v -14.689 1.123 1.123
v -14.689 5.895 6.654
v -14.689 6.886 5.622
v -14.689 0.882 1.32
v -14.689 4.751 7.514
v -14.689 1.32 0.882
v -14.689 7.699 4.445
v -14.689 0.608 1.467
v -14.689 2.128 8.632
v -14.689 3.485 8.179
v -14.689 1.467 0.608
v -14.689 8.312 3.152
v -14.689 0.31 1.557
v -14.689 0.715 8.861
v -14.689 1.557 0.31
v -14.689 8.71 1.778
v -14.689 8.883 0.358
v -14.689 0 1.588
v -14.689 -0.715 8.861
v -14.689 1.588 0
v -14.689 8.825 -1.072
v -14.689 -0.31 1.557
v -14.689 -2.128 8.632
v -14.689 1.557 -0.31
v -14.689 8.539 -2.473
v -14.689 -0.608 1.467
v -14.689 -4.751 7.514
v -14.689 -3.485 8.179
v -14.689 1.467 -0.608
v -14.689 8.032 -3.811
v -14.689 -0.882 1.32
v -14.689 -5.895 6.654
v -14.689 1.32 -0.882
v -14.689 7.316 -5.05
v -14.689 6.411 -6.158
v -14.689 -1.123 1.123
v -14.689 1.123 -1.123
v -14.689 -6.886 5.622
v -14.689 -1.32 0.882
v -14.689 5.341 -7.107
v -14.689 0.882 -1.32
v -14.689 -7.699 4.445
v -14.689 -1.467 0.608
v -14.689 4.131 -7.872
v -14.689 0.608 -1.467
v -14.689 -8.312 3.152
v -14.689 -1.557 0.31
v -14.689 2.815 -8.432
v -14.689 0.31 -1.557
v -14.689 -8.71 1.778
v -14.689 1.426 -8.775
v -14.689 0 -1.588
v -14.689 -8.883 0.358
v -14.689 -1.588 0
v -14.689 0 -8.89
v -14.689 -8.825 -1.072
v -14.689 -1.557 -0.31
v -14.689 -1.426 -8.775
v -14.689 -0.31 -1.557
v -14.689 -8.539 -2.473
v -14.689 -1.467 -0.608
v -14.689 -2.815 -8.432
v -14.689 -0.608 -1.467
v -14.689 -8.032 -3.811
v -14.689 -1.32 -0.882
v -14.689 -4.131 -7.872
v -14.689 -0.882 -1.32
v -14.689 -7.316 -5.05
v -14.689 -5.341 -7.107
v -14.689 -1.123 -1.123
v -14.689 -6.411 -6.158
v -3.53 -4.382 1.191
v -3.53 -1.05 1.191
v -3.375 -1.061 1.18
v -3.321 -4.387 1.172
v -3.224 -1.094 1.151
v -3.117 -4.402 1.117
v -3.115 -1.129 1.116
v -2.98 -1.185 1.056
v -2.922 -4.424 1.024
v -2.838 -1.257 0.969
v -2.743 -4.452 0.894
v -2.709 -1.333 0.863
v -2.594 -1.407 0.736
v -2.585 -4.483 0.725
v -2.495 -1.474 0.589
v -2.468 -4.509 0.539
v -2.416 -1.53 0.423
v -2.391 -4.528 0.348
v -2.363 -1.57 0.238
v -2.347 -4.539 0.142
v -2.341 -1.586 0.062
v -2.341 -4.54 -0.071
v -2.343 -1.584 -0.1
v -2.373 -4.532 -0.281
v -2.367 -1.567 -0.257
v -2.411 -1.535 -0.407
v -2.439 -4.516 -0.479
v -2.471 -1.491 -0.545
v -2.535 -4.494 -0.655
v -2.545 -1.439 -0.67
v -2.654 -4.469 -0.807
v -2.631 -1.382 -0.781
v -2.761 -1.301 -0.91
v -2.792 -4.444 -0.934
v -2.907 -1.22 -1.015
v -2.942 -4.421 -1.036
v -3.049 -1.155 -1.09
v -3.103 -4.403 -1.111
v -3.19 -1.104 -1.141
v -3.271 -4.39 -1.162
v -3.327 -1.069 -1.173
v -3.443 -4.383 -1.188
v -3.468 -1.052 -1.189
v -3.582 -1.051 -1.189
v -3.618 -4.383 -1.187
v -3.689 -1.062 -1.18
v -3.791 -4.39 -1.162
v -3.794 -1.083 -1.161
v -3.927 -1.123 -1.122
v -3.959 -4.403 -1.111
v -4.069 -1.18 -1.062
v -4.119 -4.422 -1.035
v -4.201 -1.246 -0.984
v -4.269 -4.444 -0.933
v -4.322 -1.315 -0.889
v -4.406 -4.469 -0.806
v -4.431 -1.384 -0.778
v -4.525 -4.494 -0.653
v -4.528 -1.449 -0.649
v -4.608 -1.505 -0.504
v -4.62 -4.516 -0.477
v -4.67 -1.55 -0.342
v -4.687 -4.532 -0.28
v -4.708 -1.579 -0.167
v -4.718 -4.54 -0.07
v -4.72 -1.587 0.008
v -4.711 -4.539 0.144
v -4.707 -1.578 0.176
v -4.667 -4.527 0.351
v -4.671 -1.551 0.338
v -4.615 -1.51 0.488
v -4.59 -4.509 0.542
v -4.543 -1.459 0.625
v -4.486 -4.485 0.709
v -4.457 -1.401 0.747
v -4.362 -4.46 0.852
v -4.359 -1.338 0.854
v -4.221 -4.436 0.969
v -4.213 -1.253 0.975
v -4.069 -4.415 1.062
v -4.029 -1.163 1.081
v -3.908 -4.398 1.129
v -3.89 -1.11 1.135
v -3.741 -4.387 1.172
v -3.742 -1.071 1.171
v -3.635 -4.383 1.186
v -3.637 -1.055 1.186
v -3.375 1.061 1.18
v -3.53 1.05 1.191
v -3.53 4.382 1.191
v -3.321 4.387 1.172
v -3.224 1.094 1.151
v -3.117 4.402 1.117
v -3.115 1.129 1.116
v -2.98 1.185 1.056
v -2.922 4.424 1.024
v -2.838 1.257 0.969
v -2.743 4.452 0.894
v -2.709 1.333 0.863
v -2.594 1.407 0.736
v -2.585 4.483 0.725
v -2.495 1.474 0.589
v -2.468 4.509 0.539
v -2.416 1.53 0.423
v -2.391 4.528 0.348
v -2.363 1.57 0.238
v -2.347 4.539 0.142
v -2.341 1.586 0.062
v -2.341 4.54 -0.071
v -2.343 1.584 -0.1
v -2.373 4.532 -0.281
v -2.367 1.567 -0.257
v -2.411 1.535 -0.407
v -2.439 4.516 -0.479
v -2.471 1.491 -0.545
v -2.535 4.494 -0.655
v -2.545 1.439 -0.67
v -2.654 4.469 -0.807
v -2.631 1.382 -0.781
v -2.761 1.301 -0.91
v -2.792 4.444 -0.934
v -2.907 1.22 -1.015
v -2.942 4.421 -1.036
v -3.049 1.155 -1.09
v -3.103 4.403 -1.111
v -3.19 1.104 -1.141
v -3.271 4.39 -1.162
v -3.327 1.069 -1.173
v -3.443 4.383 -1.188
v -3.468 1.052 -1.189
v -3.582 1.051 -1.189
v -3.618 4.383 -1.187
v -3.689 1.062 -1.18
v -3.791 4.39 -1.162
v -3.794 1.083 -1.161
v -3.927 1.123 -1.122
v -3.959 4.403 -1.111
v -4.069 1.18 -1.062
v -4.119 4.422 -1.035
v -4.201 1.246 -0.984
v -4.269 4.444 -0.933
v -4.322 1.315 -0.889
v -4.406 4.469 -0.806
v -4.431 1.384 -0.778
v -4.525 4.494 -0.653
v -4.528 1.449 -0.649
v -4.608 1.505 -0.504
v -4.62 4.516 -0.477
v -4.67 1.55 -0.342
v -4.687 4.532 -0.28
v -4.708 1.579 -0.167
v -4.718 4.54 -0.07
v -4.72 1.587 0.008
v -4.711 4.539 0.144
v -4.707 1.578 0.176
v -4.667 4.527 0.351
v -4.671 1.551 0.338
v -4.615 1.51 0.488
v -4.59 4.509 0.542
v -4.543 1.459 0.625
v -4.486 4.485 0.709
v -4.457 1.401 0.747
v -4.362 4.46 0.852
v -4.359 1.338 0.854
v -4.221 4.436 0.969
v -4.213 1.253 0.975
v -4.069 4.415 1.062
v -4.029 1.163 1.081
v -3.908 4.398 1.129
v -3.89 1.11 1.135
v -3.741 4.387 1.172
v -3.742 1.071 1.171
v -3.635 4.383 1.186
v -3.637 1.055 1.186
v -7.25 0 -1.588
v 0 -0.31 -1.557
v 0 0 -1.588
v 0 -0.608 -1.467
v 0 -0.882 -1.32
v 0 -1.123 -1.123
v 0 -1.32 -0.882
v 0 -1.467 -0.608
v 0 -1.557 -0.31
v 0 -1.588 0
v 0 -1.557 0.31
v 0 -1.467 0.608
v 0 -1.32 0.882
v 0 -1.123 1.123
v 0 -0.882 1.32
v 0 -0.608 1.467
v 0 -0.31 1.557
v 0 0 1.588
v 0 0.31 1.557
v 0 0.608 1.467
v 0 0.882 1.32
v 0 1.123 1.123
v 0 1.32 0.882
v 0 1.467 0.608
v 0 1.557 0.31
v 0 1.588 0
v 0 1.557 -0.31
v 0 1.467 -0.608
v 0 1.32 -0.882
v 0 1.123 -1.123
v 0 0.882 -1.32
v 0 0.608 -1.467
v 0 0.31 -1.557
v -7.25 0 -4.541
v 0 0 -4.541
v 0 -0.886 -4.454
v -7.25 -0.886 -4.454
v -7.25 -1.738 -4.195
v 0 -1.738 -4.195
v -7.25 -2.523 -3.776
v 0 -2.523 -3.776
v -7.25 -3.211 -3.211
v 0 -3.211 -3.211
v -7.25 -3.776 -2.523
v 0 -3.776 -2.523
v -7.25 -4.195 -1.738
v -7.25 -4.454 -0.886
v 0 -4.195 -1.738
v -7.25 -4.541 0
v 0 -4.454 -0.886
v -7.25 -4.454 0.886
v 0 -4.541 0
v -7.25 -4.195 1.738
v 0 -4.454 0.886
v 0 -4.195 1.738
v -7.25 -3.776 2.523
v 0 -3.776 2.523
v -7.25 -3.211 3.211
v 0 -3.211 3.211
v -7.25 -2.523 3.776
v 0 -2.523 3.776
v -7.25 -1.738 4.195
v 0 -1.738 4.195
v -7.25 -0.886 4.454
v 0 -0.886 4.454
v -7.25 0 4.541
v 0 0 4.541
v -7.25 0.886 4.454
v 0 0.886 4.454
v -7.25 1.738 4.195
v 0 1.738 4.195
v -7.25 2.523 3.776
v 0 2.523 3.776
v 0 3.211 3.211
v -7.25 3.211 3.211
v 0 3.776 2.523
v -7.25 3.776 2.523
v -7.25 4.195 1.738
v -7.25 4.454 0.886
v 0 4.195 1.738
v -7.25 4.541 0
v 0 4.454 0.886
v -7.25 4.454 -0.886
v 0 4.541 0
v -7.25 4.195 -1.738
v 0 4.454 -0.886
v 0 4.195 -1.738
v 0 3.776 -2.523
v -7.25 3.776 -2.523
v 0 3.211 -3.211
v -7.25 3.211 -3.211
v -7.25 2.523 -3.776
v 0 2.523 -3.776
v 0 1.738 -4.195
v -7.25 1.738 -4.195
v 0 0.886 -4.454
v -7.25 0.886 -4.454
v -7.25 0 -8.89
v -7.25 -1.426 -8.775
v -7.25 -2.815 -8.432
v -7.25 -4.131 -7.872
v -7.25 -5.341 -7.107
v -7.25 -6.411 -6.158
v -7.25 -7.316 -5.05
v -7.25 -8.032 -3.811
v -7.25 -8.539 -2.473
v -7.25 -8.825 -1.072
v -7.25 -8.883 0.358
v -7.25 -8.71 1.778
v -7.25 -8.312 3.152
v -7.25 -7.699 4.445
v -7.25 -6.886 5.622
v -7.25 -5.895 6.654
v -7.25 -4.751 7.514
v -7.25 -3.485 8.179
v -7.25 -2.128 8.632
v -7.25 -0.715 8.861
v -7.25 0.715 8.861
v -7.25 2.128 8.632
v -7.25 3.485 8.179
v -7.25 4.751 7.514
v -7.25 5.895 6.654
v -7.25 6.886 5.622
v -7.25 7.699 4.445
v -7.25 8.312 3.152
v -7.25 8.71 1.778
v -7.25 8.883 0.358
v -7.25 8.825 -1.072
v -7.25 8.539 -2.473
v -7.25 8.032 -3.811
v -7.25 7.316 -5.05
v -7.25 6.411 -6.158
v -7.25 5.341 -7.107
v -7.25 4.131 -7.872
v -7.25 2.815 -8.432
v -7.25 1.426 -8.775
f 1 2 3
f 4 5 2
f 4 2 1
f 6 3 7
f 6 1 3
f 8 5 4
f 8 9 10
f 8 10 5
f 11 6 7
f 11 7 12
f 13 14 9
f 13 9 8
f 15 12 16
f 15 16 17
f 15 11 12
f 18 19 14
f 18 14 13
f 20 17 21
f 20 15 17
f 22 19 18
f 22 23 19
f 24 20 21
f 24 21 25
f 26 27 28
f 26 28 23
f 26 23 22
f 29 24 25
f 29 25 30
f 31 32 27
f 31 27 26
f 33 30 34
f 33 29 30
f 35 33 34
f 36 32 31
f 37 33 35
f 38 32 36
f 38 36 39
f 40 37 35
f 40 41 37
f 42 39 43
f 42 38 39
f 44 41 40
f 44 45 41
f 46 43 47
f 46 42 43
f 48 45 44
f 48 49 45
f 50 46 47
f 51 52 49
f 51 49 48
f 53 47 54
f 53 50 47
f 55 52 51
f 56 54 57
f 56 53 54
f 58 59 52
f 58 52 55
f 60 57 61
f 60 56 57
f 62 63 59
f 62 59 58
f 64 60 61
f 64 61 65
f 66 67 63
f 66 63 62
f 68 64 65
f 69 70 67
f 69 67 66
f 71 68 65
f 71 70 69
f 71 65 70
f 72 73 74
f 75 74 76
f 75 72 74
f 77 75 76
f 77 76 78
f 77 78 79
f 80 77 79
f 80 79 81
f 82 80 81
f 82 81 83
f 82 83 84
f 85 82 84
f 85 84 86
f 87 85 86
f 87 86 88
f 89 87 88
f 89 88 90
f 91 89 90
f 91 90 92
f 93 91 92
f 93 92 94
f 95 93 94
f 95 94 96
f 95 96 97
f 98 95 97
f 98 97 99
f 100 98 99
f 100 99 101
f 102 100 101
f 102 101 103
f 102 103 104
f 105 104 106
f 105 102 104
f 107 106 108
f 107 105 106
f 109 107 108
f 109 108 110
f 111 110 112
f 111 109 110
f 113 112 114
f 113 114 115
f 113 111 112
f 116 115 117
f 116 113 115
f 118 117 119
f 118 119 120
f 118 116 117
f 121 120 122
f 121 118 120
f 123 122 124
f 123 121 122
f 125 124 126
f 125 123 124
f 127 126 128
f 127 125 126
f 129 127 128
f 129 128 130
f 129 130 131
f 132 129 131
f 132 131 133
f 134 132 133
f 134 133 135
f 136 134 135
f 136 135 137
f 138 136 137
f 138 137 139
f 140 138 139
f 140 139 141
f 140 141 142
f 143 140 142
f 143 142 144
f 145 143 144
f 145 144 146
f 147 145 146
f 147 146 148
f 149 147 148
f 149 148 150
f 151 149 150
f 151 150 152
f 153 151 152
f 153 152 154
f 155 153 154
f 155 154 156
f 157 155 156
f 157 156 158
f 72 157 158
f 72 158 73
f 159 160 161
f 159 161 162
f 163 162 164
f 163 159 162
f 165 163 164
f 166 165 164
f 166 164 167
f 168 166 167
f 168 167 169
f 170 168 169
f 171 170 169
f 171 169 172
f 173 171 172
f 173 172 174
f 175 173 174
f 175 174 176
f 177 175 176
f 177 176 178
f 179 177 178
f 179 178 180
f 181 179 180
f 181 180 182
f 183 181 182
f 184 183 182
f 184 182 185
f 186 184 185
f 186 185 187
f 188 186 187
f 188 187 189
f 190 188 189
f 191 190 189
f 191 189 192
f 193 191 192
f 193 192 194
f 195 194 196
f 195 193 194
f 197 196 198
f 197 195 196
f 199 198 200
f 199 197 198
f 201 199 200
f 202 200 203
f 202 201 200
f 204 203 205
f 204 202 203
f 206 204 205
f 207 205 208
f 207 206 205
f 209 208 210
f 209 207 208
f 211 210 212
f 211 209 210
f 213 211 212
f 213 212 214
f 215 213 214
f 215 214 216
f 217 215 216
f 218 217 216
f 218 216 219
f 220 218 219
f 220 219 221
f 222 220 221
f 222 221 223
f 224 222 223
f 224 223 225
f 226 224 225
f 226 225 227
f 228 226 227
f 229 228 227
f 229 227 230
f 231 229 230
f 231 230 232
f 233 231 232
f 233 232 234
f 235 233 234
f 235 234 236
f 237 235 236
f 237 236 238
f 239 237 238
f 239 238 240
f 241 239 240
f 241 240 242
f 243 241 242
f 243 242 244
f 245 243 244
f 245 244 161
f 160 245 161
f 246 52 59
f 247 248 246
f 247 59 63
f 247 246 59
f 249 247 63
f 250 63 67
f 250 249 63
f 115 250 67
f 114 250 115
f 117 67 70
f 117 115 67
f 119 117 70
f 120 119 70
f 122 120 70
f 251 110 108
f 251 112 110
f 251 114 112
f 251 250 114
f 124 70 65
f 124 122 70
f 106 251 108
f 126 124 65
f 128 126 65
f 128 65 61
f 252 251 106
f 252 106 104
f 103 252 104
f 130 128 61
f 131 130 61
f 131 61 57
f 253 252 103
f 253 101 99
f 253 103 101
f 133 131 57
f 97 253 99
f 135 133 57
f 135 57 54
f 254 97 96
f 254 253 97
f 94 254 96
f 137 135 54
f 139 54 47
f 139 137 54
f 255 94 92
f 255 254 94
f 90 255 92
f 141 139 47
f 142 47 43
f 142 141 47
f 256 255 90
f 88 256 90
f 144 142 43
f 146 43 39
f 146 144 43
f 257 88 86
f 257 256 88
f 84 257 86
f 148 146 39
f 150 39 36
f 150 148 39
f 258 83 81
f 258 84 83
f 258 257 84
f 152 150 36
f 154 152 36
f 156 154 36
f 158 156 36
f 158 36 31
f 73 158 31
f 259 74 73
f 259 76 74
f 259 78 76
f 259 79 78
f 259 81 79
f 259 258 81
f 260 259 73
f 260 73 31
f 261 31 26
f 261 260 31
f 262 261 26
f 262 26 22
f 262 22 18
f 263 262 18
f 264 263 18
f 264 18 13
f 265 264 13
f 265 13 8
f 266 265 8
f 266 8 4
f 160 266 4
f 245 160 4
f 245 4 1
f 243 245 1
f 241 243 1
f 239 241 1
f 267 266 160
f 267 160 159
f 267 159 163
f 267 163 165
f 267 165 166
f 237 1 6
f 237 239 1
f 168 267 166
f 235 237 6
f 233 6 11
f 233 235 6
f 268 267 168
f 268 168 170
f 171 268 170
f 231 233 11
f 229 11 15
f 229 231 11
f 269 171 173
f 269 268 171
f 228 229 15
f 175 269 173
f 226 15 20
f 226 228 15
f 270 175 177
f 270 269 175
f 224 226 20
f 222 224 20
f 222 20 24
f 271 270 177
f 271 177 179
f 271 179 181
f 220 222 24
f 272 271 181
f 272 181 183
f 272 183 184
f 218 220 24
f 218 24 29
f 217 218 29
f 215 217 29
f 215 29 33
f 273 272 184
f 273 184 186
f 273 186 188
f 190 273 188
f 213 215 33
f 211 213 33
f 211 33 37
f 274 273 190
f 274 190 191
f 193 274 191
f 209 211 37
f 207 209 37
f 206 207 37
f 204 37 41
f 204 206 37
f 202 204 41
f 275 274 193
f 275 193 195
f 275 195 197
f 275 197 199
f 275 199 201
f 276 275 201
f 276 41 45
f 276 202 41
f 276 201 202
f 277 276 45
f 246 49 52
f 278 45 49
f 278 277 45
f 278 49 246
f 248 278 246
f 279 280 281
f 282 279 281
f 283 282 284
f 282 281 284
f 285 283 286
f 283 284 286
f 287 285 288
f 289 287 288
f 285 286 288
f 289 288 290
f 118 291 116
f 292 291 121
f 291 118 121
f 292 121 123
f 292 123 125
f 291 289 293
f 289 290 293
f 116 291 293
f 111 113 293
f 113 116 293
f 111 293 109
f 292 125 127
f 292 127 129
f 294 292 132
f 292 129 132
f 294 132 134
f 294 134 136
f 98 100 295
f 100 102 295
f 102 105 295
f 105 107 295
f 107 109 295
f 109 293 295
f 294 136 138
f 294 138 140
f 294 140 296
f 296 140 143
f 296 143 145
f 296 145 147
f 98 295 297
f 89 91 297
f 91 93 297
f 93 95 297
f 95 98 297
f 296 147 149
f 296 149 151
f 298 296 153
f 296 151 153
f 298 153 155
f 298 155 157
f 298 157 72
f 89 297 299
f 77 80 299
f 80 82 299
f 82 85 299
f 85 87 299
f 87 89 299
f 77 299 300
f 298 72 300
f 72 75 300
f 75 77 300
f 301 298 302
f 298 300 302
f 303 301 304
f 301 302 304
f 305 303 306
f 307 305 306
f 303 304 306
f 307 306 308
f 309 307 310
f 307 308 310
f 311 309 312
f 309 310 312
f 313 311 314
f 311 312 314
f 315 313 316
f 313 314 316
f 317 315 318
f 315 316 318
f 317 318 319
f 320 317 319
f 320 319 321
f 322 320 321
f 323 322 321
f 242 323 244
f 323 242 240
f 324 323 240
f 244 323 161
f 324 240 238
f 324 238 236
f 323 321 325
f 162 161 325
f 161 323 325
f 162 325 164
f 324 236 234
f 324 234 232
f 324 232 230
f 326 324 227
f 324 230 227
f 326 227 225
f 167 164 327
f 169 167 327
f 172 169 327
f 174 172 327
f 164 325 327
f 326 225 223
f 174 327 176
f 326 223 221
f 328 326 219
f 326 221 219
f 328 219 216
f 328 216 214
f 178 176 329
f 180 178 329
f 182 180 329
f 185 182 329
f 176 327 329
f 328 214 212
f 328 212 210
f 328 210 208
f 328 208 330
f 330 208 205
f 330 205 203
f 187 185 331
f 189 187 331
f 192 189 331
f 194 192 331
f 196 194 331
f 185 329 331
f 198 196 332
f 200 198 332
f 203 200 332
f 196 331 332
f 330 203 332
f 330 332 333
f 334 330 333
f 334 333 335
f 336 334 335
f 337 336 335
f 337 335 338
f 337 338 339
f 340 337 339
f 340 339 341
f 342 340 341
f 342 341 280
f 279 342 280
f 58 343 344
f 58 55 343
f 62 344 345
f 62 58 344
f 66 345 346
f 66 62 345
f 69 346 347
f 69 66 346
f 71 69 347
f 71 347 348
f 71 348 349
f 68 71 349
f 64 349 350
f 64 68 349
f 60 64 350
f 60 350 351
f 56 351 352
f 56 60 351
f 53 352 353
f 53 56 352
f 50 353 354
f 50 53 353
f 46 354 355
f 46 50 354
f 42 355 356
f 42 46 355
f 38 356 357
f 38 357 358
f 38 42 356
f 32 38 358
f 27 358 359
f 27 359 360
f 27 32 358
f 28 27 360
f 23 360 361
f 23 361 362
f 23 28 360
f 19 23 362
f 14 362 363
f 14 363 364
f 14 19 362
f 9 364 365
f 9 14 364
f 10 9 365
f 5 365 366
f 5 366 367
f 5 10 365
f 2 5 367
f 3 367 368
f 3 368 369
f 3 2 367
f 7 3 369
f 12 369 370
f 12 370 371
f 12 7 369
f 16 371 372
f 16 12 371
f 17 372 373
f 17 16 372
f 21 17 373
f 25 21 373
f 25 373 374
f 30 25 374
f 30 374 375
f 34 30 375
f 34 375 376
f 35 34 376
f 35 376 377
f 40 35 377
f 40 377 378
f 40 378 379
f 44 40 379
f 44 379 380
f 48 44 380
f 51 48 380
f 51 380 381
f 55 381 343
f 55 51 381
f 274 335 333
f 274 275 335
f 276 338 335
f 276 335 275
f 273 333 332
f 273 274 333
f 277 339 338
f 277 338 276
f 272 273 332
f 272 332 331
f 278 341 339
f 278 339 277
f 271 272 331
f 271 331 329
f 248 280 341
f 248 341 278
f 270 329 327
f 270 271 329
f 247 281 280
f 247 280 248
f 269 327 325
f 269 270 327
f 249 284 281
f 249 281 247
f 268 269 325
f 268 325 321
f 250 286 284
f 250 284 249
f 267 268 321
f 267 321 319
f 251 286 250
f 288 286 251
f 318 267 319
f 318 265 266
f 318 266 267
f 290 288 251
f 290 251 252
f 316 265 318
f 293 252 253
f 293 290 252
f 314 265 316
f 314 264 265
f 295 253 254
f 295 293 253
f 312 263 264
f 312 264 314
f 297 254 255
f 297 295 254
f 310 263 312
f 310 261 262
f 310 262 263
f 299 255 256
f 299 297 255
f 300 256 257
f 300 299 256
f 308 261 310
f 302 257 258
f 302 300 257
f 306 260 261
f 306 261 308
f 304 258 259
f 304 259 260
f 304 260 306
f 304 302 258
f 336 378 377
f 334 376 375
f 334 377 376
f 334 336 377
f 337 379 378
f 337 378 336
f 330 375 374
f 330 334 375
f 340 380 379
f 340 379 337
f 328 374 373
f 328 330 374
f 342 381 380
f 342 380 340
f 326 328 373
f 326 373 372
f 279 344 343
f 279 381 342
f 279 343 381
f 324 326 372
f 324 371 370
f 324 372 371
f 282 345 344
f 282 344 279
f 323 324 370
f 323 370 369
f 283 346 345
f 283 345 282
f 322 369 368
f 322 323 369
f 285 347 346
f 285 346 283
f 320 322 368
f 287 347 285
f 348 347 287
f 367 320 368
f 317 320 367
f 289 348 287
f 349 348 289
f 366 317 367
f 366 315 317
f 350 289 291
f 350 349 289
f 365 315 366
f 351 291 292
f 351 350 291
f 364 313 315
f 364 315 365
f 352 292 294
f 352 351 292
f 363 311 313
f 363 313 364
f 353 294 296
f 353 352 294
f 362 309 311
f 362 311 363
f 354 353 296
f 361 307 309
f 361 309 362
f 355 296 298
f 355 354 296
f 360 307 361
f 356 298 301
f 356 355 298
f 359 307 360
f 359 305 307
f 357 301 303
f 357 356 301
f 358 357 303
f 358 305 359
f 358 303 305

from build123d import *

# Parameters (mm, degrees)
CUT_EXTRUDE1_DEPTH      = 20.334926531
CUT_EXTRUDE1_DEPTH_BACK = 20.334926531
SKETCH2_R               = 1.190625


with BuildPart() as part:
    # Sketch1 → Revolve1 (revolve)
    with BuildSketch(Plane.XY):
        Polygon((0, 1.5875), (0, 4.540976685), (-7.250077802, 4.540976685), (-7.250077802, 8.89), (-14.689288069, 8.89), (-14.689288069, 1.5875), align=None)
    revolve(axis=Axis((0, 0, 0), (-1, 0, 0)))

    # Sketch2 → Cut-Extrude1 (cut, two sides: drawn at the far end of the back side and taken through both)
    with BuildSketch(Plane(origin=(0, 0, 0), x_dir=(1, 0, 0), z_dir=(0, 1, 0)).offset(-CUT_EXTRUDE1_DEPTH_BACK)):
        with Locations((-3.529556327, 0)):
            Circle(SKETCH2_R)
    extrude(amount=CUT_EXTRUDE1_DEPTH + CUT_EXTRUDE1_DEPTH_BACK, mode=Mode.SUBTRACT)


solid = part.part
